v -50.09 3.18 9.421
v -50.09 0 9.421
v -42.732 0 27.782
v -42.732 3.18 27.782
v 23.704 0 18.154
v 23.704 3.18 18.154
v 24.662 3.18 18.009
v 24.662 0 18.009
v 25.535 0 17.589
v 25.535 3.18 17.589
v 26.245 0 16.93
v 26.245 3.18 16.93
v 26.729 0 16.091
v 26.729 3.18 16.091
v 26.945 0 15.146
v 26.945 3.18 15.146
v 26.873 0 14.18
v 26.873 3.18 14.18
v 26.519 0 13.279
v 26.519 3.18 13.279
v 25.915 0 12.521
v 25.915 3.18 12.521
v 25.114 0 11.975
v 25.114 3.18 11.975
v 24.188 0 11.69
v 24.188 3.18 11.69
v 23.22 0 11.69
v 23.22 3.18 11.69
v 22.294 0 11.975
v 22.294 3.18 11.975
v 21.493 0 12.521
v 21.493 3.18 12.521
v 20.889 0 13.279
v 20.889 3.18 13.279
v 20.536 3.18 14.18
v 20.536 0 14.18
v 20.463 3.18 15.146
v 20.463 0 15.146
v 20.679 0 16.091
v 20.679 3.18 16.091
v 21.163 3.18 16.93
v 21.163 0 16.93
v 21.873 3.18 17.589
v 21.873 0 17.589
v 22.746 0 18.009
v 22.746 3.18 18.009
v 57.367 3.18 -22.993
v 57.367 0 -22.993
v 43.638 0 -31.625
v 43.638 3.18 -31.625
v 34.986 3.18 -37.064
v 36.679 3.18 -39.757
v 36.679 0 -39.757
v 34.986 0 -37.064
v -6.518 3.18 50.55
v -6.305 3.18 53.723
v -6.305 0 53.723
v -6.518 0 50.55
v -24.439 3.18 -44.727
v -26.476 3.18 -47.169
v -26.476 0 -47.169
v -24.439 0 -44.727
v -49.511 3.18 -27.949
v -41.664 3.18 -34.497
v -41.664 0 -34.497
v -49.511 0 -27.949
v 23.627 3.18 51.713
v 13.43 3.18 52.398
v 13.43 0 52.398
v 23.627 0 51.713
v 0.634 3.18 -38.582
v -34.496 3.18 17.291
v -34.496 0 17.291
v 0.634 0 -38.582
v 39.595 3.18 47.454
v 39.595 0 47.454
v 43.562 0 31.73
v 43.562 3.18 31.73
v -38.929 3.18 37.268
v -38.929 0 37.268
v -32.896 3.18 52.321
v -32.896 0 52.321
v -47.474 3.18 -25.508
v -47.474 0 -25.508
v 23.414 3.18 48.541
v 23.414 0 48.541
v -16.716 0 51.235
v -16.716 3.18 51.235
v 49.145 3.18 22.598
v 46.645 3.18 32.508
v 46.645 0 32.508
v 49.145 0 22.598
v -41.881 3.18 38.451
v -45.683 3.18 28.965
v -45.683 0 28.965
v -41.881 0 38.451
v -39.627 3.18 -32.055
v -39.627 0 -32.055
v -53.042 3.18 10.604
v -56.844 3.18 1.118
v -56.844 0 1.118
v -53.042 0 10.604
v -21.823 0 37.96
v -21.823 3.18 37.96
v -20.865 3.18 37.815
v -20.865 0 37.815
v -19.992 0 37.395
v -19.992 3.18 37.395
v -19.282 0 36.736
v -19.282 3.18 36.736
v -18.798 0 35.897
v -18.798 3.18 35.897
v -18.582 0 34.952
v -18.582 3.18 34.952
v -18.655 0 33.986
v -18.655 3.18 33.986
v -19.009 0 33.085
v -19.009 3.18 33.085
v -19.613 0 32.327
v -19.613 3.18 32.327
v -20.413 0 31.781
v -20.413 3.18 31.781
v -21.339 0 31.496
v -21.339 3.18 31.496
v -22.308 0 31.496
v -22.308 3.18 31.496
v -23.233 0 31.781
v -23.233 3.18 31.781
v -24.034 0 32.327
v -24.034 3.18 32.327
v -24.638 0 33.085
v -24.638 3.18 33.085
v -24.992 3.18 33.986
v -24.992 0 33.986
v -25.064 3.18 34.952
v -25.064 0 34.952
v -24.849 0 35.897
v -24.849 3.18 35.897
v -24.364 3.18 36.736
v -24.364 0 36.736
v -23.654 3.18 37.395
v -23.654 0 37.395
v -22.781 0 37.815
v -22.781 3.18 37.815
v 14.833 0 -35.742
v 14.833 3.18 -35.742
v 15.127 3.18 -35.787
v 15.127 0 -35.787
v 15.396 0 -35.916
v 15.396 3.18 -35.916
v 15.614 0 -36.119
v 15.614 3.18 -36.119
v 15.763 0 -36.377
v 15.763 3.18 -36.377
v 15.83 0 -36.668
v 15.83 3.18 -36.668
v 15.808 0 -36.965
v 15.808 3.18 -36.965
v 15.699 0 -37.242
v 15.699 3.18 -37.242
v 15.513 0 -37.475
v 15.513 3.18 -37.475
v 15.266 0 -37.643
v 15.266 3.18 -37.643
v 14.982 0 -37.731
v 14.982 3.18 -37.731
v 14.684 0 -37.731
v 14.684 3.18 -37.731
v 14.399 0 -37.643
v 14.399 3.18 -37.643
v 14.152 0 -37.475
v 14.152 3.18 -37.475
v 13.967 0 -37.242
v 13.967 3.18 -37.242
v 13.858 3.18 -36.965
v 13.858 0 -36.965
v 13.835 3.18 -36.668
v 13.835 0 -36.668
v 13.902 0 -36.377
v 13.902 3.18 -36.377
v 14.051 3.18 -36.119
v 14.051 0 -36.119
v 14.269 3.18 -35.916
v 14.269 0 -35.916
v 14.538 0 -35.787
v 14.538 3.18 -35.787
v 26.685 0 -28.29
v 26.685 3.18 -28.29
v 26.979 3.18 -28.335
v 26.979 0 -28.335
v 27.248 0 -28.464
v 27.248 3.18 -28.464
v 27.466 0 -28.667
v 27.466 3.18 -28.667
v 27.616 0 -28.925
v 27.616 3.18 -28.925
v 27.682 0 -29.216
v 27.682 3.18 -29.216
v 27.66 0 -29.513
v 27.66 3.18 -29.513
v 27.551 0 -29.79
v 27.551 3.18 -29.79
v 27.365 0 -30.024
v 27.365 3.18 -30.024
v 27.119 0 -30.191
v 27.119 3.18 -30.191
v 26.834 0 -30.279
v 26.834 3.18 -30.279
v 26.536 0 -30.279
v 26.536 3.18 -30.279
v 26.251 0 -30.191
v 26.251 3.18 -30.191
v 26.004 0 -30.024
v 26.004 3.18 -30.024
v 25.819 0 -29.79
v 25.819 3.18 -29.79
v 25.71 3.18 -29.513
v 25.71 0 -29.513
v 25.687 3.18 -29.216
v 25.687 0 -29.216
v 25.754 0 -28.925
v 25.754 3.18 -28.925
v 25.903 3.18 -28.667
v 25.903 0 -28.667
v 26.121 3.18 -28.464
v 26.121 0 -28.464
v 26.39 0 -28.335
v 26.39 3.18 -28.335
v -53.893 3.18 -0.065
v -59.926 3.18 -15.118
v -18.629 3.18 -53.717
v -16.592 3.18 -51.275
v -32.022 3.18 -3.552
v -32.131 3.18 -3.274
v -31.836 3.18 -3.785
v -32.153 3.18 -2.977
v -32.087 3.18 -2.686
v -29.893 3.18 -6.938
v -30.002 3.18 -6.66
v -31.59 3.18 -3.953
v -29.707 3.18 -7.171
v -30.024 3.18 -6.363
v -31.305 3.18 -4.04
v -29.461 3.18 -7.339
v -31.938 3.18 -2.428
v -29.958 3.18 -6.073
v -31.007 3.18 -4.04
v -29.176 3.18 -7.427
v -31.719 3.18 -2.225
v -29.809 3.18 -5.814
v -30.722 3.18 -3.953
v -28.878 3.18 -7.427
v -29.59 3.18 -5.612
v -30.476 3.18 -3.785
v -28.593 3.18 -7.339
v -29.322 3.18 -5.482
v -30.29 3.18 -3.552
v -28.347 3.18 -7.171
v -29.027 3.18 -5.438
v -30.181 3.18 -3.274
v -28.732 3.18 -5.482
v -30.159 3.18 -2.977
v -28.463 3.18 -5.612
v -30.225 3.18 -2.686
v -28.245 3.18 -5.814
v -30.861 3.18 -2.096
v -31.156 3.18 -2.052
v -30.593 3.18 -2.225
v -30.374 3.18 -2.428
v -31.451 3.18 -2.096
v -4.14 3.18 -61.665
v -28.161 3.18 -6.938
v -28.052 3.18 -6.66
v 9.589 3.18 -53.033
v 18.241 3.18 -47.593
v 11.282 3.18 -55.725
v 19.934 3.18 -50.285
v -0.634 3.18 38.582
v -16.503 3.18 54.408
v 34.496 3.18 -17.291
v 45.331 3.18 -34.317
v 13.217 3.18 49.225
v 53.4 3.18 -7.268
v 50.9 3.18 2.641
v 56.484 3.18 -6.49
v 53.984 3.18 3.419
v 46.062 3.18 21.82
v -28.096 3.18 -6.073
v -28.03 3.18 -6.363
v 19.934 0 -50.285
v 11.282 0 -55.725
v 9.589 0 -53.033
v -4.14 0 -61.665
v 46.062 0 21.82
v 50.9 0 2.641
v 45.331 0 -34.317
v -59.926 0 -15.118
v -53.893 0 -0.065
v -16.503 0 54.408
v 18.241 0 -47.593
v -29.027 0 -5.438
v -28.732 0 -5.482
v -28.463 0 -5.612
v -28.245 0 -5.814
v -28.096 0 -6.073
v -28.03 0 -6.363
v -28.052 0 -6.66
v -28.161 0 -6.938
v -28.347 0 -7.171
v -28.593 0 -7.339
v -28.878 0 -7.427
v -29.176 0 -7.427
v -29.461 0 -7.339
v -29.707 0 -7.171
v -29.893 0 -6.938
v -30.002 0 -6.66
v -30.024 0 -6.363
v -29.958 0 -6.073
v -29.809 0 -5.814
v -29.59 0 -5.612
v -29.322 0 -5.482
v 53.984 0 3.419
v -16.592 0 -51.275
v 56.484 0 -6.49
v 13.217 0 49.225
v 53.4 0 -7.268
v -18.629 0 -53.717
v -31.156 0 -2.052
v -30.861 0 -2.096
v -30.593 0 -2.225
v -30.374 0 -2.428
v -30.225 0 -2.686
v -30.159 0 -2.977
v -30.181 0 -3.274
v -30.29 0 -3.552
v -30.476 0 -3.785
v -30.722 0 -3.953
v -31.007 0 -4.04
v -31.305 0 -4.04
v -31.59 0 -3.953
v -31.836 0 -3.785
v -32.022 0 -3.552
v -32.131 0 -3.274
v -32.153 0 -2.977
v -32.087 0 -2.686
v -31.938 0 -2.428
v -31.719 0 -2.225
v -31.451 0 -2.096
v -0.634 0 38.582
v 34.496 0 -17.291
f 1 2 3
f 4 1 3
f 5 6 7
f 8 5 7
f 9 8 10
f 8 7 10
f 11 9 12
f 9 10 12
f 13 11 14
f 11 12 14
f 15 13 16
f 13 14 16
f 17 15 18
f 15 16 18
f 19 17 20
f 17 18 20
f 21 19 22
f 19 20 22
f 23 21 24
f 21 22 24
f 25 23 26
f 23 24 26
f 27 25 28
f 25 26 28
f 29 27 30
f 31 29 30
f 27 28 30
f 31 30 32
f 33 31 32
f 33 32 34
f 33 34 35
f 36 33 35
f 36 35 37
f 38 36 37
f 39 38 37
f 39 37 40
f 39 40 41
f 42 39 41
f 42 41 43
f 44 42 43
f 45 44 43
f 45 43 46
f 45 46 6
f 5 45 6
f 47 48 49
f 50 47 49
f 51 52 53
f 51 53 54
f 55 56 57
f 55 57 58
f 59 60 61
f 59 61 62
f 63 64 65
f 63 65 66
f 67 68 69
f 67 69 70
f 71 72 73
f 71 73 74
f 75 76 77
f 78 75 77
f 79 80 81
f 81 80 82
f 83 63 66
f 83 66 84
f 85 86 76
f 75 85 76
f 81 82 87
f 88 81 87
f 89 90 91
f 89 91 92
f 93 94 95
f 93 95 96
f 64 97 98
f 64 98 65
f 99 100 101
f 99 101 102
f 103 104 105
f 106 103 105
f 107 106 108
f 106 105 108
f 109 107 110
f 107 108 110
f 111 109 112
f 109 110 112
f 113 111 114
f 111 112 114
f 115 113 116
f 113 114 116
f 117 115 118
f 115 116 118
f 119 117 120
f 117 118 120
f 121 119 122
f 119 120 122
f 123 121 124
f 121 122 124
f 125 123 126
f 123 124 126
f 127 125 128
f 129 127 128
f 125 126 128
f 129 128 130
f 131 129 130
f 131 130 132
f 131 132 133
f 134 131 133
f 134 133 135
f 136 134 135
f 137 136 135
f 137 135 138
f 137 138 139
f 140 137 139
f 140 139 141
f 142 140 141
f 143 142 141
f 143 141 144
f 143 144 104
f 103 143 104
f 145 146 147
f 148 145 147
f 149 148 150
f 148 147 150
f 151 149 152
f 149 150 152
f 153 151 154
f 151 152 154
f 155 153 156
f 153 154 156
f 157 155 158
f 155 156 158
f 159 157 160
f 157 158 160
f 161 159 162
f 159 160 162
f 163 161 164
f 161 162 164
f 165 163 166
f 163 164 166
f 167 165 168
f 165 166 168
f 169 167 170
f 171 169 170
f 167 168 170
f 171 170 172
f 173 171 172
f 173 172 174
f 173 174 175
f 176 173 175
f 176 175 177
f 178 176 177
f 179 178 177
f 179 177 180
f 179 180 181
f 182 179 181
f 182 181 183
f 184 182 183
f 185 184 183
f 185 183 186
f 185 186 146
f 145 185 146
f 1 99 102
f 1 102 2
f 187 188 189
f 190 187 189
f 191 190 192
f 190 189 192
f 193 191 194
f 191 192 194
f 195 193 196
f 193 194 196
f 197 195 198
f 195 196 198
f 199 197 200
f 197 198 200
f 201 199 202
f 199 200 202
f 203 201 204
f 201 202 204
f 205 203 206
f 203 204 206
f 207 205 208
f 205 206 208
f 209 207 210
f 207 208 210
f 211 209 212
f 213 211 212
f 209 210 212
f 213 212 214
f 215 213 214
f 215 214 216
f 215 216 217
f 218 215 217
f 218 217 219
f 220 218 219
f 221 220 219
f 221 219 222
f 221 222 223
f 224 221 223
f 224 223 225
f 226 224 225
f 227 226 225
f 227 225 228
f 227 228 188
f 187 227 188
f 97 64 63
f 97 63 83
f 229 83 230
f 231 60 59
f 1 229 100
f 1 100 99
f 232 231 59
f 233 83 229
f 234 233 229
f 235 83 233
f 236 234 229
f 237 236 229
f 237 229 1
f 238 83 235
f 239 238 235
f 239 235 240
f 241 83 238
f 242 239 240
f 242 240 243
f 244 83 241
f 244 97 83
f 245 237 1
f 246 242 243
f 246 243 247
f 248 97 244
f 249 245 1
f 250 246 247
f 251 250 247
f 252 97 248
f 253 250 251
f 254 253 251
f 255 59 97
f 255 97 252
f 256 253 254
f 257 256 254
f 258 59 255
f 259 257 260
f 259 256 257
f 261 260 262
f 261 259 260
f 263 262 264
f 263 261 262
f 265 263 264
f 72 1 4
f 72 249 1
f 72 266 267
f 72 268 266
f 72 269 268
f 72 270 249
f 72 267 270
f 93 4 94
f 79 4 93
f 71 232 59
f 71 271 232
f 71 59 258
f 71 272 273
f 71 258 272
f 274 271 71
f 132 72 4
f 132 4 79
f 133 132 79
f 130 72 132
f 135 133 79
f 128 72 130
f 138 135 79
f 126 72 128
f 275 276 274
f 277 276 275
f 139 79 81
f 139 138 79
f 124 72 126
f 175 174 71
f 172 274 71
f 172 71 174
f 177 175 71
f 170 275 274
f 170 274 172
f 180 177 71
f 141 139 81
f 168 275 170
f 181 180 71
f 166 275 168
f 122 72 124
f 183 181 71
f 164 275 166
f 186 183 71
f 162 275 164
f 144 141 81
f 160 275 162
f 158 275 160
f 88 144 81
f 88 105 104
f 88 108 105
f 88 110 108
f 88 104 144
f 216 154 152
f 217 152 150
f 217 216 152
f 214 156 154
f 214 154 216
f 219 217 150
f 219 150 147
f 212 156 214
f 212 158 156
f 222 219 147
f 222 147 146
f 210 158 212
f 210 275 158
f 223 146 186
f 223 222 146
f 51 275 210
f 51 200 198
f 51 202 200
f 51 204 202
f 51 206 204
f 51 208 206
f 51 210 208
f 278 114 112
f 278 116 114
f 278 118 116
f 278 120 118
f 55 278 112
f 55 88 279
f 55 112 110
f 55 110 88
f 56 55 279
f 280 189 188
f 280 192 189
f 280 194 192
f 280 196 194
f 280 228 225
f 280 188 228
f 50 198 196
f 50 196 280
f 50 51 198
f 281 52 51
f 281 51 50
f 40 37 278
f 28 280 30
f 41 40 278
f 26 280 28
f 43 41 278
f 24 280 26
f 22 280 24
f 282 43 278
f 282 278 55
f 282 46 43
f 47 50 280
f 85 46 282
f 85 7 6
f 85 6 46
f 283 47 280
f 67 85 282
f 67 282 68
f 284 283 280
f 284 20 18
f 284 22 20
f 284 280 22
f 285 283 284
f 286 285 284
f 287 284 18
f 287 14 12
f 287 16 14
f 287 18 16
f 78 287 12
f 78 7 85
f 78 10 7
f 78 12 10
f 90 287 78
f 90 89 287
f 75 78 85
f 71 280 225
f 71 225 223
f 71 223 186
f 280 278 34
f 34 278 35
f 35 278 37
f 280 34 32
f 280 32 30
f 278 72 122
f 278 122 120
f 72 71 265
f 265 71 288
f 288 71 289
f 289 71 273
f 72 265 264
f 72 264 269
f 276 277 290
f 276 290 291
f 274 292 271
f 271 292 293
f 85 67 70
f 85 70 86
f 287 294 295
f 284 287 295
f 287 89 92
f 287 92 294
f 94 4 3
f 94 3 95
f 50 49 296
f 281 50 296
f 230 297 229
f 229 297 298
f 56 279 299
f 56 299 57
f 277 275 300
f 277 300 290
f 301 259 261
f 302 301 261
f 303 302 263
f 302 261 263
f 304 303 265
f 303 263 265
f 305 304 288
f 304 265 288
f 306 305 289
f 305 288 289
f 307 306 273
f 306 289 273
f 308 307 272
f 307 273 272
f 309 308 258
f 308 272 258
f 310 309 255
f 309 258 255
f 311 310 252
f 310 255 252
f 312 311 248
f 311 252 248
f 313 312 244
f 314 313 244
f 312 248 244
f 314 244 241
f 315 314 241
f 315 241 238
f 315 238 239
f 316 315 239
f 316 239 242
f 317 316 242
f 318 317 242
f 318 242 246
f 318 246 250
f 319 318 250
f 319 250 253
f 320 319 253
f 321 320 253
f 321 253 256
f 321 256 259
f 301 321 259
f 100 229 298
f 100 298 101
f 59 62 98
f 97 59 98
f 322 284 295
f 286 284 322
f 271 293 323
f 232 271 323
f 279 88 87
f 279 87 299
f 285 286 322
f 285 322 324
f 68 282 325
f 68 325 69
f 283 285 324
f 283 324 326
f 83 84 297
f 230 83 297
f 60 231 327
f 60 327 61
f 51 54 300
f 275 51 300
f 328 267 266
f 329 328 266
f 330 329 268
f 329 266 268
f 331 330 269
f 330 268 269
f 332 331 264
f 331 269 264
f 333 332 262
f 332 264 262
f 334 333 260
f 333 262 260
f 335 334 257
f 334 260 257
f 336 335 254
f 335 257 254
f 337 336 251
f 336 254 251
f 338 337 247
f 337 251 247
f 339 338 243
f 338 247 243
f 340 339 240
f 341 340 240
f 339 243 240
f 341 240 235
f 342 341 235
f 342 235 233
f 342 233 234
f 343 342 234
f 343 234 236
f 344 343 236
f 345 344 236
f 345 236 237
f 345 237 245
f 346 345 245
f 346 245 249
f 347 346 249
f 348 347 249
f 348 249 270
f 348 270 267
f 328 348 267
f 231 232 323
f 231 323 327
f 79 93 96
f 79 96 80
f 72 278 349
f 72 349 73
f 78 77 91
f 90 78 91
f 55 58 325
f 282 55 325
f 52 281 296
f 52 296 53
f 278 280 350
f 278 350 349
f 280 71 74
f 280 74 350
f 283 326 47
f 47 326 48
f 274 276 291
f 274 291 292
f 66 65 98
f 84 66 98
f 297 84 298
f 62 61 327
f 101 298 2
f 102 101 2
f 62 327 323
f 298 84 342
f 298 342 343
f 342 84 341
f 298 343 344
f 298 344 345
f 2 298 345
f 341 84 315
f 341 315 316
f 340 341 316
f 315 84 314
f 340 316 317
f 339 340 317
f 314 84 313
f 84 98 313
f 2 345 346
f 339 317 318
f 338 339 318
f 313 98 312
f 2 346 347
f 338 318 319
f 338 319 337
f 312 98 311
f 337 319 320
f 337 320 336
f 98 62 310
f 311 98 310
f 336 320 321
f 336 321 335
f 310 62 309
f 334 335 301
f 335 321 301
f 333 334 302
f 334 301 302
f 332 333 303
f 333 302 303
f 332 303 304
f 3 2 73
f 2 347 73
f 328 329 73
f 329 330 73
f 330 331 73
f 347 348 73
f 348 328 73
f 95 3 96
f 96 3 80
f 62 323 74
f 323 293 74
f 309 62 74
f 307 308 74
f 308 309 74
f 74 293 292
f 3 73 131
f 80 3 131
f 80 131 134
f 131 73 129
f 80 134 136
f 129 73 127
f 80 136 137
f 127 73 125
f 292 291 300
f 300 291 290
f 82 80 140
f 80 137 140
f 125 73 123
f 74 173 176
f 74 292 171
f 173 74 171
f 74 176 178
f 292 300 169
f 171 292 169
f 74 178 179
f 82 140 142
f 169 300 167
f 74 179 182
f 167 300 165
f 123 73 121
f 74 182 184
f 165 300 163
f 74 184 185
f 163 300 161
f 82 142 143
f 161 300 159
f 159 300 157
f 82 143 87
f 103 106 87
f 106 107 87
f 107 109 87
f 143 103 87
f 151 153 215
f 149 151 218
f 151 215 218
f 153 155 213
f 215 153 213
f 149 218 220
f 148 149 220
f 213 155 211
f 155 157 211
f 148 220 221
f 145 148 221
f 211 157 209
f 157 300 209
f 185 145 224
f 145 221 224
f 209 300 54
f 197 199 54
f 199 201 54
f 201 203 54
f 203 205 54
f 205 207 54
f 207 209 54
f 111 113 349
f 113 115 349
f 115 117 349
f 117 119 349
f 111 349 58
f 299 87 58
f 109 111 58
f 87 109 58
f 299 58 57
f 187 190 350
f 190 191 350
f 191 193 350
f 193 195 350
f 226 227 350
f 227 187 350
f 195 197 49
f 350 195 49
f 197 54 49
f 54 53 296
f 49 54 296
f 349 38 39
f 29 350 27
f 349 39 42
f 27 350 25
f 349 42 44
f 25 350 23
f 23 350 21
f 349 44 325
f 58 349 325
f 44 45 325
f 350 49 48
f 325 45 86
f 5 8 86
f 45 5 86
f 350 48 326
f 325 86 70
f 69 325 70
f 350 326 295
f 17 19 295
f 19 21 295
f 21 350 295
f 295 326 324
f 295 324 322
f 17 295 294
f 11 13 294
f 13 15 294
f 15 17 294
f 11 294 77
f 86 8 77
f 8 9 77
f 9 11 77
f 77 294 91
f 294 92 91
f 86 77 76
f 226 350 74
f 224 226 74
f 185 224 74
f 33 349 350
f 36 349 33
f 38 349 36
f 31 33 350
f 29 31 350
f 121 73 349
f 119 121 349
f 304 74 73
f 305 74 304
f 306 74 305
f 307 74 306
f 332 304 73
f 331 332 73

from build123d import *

# Parameters (mm, degrees)
BOSS_EXTRUDE1_DEPTH = 3.18
SKETCH4_R           = 3.25
TOP_CUT_DEPTH       = 10
SKETCH7_R           = 1
TOP_CUT_2_DEPTH     = 87.044973388
SKETCH10_R          = 1
TOP_CUT_3_DEPTH     = 10
EXTRUDE_M_DEPTH     = 3.18
CIRCLE_M_COUNT      = 5


with BuildPart() as part:
    # Sketch1 → Boss-Extrude1 (new body)
    with BuildSketch(Plane(origin=(0, 0, 0), x_dir=(1, 0, 0), z_dir=(0, 1, 0))):
        Polygon((-59.925822748, 15.118064705), (-32.896231583, -52.321105303), (39.594833528, -47.454286112), (57.367184482, 22.992743574), (-4.139963679, 61.664583135), align=None)
    extrude(amount=BOSS_EXTRUDE1_DEPTH)

    # Sketch4 → Top Cut (cut)
    with BuildSketch(Plane(origin=(0, 3.18, 0), x_dir=(1, 0, 0), z_dir=(0, 1, 0))):
        with Locations(Location((-21.823160529, -34.709503951, 0), (0, 0, 270))):
            Circle(SKETCH4_R)
        with Locations(Location((23.704051479, -14.903621825, 0), (0, 0, 270))):
            Circle(SKETCH4_R)
        Polygon((-34.496448207, -17.291473653), (0.633517523, 38.582361975), (34.496448207, 17.291473653), (-0.633517523, -38.582361975), align=None)
    extrude(amount=-TOP_CUT_DEPTH, mode=Mode.SUBTRACT)

    # Sketch7 → Top Cut 2 (cut, through all)
    with BuildSketch(Plane(origin=(0, 3.18, 0), x_dir=(1, 0, 0), z_dir=(0, 1, 0))):
        with Locations(Location((-29.026773559, 6.437889154, 0), (0, 0, 270))):
            Circle(SKETCH7_R)
        with Locations(Location((-31.155862391, 3.051596086, 0), (0, 0, 270))):
            Circle(SKETCH7_R)
    extrude(amount=-TOP_CUT_2_DEPTH, mode=Mode.SUBTRACT)

    # Sketch10 → Top Cut 3 (cut)
    with BuildSketch(Plane(origin=(0, 3.18, 0), x_dir=(1, 0, 0), z_dir=(0, 1, 0))):
        with Locations(Location((14.832603244, 36.742262873, 0), (0, 0, 270))):
            Circle(SKETCH10_R)
        with Locations(Location((26.684628983, 29.29045196, 0), (0, 0, 270))):
            Circle(SKETCH10_R)
    extrude(amount=-TOP_CUT_3_DEPTH, mode=Mode.SUBTRACT)

    # Sketch3 → Extrude M (add)
    with BuildSketch(Plane(origin=(0, 3.18, 0), x_dir=(1, 0, 0), z_dir=(0, 1, 0))):
        Polygon((-49.511175703, 27.949382471), (-45.436591686, 23.066006068), (-37.589405077, 29.613529441), (-41.663989094, 34.496905844), align=None)
        Polygon((-26.476381351, 47.169118399), (-22.401797334, 42.285741997), (-14.554610725, 48.83326537), (-18.629194741, 53.716641772), align=None)
    extrude_m = extrude(amount=-EXTRUDE_M_DEPTH)

    # Circle M: Extrude M ×5 about axis
    circle_m_axis = Axis((0, 0, 0), (0, 1, 0))
    for i in range(1, CIRCLE_M_COUNT):
        add(extrude_m.rotate(circle_m_axis, i * 360 / CIRCLE_M_COUNT))


solid = part.part
